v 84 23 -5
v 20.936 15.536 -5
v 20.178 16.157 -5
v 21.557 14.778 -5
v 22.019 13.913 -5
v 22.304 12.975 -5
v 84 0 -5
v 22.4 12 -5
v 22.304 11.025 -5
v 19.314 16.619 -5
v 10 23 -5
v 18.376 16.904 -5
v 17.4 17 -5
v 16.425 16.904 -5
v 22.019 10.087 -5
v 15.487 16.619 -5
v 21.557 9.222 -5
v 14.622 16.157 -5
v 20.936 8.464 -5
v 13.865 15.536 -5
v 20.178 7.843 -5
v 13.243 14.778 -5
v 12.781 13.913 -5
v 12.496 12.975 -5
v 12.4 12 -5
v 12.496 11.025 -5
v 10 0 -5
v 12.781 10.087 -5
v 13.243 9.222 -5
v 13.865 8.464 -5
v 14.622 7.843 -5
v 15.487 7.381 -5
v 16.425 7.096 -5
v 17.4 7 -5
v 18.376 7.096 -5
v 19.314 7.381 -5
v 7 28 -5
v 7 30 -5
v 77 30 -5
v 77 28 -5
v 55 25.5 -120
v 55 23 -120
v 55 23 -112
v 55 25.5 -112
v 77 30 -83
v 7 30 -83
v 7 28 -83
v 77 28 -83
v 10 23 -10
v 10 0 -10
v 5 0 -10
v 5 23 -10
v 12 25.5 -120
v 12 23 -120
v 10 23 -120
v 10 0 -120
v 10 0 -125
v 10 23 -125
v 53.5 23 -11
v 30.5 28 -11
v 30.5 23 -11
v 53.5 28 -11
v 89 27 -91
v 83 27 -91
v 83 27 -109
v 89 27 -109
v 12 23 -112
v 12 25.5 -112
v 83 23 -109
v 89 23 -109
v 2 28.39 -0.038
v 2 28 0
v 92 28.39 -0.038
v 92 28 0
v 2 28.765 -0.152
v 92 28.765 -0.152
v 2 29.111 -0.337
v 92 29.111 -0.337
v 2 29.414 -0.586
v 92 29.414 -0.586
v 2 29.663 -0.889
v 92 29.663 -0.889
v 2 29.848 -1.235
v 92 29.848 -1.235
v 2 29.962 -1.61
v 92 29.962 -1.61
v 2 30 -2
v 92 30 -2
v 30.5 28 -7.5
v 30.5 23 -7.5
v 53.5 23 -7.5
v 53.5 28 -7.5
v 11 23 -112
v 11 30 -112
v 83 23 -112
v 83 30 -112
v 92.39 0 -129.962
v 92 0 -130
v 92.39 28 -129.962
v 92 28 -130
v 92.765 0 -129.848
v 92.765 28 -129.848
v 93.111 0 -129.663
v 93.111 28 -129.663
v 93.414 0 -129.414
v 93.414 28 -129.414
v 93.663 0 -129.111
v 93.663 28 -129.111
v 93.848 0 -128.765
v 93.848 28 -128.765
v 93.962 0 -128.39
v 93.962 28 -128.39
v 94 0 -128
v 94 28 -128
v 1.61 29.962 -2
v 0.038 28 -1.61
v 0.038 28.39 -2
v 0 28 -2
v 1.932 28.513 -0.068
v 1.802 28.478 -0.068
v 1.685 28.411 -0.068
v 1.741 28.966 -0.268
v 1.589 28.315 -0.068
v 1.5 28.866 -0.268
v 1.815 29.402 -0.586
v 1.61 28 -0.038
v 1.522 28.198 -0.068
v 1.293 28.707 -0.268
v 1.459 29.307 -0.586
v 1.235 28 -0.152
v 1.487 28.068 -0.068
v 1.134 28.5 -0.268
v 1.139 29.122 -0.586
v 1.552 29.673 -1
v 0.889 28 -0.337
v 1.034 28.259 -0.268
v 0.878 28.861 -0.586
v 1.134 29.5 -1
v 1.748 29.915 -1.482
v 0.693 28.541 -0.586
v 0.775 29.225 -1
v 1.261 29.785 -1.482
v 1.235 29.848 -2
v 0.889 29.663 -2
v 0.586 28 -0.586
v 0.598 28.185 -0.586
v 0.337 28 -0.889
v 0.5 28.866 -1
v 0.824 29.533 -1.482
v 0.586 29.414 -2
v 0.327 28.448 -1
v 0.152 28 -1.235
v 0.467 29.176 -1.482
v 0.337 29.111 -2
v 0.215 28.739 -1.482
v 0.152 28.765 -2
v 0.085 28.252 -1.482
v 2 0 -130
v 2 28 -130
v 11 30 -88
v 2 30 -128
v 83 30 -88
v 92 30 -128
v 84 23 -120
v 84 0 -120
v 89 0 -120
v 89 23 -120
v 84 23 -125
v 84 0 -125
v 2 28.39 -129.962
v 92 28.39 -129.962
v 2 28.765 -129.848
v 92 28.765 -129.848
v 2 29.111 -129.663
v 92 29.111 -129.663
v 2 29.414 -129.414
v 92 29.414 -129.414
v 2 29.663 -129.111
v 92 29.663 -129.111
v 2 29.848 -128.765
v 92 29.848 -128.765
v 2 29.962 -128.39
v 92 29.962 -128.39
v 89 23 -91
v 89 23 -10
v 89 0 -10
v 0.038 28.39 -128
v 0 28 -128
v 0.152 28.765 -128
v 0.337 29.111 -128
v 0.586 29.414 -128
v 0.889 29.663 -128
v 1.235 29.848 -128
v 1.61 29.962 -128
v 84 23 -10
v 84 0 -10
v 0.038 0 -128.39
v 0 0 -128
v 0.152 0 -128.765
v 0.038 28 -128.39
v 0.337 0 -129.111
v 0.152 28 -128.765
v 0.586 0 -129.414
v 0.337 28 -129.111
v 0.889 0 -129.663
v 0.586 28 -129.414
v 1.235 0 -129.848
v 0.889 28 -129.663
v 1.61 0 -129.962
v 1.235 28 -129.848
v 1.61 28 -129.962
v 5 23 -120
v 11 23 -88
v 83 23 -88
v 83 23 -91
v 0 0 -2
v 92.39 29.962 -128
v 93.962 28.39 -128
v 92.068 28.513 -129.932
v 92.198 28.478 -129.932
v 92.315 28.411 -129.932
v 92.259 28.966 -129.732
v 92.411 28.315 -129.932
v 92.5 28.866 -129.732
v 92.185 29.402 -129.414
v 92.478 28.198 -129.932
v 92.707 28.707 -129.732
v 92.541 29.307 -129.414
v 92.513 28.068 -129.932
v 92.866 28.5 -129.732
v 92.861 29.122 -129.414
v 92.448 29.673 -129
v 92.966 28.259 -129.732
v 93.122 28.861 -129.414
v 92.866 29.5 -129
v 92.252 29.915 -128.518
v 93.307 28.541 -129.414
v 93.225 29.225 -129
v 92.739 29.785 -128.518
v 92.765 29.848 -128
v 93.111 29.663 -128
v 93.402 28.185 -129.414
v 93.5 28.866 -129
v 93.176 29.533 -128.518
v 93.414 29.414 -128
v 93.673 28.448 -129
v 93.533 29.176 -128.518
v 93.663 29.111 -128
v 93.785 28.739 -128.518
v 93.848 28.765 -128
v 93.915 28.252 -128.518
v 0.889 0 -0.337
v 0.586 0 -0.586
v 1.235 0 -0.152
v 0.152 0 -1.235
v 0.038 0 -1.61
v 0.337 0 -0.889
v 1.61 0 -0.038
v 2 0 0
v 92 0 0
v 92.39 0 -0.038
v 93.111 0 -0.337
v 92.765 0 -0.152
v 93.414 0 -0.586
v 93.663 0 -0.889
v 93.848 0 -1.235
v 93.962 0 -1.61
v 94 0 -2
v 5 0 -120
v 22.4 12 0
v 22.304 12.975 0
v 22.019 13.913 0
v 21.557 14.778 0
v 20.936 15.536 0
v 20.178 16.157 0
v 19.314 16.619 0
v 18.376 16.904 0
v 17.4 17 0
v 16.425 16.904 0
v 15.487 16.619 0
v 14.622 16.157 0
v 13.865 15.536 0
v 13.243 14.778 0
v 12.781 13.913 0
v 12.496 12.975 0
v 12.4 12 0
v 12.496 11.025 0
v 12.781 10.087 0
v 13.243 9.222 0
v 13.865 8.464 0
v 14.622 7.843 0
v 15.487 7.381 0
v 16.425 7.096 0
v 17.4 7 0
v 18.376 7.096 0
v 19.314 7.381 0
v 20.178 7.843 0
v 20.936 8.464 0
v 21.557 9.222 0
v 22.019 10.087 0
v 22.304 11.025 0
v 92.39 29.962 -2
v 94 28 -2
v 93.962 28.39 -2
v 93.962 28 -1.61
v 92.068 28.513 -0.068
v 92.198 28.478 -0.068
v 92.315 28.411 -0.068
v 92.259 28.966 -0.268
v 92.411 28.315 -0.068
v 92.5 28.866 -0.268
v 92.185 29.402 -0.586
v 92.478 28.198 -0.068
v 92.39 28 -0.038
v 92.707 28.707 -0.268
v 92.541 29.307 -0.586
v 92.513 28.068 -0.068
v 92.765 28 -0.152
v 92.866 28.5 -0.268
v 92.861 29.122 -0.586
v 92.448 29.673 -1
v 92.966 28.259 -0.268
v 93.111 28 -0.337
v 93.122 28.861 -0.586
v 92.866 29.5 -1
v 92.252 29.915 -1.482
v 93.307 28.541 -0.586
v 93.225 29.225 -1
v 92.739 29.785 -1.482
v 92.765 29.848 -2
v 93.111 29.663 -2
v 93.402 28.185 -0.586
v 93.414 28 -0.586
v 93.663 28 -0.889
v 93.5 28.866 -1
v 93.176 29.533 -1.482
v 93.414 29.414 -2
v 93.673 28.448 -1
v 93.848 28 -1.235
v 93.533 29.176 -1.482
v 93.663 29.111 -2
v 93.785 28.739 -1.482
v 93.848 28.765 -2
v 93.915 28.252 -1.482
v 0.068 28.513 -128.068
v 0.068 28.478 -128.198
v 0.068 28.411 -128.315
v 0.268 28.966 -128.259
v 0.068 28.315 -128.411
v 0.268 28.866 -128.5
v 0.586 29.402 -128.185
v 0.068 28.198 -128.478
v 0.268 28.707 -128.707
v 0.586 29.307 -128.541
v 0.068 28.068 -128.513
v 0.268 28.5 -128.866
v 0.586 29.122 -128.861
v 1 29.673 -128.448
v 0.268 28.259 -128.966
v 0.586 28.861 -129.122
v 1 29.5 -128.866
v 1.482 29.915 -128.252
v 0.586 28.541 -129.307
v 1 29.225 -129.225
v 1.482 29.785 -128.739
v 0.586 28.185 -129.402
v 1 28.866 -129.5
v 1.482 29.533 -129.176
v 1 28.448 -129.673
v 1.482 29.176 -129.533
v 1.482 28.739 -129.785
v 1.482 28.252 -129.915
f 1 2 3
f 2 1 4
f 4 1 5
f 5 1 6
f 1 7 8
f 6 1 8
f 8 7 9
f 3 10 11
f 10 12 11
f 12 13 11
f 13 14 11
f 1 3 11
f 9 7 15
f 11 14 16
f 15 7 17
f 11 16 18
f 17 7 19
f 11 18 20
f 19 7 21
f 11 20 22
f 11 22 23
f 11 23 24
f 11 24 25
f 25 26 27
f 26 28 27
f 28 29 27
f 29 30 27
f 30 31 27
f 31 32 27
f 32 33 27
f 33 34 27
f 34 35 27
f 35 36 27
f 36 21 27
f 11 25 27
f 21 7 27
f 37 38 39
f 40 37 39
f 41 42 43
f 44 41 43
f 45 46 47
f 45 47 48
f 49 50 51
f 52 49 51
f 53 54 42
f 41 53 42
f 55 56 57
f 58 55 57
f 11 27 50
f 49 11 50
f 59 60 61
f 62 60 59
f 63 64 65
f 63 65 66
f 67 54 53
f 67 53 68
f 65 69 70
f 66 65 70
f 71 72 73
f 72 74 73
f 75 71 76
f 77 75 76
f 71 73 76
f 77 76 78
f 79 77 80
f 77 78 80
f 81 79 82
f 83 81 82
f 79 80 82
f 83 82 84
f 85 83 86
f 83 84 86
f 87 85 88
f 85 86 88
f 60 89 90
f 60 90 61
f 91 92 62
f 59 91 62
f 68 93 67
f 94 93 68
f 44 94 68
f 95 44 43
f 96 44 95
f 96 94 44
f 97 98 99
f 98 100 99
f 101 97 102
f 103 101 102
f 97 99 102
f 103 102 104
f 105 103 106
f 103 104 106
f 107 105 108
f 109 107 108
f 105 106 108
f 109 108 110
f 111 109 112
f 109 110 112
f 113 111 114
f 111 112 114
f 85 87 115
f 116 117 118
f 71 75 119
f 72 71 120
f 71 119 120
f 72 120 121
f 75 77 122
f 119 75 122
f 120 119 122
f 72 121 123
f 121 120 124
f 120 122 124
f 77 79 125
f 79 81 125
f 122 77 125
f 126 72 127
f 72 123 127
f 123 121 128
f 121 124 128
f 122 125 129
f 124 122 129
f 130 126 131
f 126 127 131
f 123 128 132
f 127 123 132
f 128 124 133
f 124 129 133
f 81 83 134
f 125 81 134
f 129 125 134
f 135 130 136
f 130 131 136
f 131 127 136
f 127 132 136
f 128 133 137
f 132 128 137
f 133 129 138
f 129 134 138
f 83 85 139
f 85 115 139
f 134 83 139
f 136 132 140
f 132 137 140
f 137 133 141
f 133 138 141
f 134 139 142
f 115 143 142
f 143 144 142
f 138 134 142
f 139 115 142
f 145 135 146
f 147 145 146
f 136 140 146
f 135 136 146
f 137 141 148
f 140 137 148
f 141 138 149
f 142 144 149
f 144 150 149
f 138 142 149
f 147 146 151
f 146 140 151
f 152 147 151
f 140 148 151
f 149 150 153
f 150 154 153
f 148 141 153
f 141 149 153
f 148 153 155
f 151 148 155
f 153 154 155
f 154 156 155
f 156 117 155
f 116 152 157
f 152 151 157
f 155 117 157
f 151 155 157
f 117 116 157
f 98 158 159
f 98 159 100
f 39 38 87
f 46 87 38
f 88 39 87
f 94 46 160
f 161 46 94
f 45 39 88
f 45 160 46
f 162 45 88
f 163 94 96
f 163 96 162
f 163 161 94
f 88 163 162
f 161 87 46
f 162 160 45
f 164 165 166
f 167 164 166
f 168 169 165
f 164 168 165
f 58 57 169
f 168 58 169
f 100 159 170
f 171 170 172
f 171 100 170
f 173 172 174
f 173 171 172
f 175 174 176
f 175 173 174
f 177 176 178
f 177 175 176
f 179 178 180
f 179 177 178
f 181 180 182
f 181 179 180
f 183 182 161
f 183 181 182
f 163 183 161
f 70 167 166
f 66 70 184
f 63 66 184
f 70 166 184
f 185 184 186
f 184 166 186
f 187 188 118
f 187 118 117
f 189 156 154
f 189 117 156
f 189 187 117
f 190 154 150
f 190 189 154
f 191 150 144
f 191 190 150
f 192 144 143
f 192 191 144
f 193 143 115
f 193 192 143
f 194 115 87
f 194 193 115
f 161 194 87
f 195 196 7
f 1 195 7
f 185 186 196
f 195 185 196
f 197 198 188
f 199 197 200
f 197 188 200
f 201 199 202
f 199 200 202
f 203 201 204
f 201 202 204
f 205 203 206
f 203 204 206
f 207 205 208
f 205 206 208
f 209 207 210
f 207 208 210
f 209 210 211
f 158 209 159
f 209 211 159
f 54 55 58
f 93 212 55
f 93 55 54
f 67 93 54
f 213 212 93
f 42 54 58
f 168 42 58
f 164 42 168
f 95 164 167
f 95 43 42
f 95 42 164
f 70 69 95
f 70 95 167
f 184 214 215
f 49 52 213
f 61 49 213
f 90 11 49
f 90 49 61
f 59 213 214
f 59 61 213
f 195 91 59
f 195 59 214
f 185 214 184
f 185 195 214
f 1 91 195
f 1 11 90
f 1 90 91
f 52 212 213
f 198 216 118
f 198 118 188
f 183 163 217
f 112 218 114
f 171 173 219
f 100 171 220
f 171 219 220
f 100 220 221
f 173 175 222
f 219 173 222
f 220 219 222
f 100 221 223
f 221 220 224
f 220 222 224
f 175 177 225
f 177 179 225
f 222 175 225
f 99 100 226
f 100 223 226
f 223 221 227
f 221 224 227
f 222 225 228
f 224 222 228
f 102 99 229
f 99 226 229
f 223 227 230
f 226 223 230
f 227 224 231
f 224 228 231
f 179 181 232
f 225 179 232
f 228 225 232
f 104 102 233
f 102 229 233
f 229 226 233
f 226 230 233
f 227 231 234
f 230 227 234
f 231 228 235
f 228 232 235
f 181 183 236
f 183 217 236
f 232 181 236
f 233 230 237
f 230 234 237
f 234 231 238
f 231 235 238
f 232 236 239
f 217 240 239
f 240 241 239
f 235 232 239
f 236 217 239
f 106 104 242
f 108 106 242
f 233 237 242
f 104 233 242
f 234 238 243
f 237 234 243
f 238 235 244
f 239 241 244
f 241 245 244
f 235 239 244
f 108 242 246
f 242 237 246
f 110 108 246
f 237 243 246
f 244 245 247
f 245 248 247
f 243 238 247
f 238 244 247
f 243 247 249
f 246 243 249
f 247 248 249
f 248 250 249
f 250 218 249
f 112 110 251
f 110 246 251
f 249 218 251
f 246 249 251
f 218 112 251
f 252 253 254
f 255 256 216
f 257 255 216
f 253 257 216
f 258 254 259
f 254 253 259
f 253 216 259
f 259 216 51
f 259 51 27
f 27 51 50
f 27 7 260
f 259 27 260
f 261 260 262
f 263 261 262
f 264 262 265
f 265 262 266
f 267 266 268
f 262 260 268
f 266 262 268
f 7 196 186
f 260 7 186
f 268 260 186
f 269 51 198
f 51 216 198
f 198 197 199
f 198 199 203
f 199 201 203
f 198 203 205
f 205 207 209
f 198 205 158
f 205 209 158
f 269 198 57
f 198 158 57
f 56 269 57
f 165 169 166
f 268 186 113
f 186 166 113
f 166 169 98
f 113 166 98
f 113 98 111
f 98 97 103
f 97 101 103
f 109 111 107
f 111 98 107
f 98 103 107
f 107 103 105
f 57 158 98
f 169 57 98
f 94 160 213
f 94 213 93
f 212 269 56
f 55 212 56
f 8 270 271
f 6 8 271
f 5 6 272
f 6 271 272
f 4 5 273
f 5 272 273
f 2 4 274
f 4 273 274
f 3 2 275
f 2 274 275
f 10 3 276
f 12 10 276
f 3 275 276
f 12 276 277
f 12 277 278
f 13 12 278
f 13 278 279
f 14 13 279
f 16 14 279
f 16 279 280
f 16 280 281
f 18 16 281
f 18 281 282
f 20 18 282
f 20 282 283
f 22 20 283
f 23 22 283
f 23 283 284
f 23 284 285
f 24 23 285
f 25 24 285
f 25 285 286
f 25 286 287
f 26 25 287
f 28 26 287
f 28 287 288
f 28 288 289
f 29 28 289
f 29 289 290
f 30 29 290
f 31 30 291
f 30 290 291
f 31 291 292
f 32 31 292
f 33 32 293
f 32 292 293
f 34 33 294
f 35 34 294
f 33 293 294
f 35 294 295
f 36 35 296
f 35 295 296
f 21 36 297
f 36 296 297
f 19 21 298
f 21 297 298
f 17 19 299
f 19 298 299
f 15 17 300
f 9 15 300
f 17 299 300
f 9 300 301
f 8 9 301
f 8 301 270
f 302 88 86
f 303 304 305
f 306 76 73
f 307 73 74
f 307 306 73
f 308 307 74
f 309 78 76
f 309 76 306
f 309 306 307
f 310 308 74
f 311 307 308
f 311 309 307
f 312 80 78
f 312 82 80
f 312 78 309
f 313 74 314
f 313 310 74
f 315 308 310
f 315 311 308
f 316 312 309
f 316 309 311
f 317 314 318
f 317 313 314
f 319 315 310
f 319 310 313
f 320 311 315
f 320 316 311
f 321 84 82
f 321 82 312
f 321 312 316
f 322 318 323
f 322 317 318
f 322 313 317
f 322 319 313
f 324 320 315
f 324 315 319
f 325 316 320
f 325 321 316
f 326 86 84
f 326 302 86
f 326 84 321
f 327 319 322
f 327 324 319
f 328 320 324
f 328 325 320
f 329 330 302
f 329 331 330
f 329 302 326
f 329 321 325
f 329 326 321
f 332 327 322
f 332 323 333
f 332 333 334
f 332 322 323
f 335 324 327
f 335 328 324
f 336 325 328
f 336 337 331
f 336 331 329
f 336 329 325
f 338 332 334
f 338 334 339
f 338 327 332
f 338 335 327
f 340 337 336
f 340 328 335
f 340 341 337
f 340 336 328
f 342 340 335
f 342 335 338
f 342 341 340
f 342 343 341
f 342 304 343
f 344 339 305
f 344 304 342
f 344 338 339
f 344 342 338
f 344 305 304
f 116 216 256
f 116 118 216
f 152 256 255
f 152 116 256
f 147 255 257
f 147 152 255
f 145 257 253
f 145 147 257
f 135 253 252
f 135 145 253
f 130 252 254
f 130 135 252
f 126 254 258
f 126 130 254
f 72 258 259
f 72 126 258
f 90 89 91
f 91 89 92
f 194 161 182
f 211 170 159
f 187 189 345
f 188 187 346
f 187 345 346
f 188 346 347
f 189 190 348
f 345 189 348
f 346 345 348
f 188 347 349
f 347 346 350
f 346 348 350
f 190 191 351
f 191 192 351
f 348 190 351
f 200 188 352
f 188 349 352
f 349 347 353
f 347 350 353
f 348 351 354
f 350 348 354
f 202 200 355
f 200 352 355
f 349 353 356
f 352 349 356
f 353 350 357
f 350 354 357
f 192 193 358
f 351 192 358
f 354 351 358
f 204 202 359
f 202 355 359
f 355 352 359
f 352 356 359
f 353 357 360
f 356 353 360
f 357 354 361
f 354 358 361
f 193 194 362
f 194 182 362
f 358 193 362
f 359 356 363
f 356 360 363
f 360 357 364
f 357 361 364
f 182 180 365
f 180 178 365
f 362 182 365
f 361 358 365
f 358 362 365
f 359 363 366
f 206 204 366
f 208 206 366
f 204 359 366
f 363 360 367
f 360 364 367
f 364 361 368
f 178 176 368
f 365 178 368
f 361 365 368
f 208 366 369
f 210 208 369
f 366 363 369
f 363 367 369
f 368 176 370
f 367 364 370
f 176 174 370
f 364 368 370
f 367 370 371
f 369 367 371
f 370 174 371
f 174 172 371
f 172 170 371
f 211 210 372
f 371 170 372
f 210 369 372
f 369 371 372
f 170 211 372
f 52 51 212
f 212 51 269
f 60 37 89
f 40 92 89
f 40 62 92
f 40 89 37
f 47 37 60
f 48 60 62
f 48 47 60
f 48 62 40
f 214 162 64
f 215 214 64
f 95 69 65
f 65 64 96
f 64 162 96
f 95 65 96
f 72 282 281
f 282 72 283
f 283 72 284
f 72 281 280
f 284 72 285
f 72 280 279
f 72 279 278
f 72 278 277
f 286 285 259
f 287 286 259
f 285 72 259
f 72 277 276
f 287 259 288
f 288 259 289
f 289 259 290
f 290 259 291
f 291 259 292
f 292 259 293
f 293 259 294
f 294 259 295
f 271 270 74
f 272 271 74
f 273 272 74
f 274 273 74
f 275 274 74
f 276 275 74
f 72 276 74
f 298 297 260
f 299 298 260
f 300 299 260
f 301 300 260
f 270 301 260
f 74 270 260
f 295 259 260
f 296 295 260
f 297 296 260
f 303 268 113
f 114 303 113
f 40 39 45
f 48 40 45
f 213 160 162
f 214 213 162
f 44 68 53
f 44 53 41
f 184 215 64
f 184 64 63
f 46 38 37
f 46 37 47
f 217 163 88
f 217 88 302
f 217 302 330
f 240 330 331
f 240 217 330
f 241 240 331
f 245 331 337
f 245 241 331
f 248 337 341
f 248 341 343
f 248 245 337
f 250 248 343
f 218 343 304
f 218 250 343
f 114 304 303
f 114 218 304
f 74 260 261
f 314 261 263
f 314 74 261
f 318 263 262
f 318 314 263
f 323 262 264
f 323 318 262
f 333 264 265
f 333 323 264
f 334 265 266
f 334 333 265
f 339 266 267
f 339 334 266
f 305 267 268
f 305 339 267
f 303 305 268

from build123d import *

# Parameters (mm, degrees)
SKETCH1_W           = 94
SKETCH1_H           = 130
BOSS_EXTRUDE1_DEPTH = 30
CUT_EXTRUDE2_DEPTH  = 23
SKETCH7_W           = 72
SKETCH7_H           = 24
CUT_EXTRUDE3_DEPTH  = 164.205392068
SKETCH8_W           = 6
SKETCH8_H           = 18
CUT_EXTRUDE4_DEPTH  = 4
SKETCH9_W           = 43
SKETCH9_H           = 8
CUT_EXTRUDE5_DEPTH  = 2.5
SKETCH10_W          = 70
SKETCH10_H          = 78
CUT_EXTRUDE6_DEPTH  = 2
SKETCH11_W          = 23
SKETCH11_H          = 3.5
CUT_EXTRUDE7_DEPTH  = 163.849623887
FILLET1_R           = 2
SKETCH12_R          = 5
CUT_EXTRUDE8_DEPTH  = 10


with BuildPart() as part:
    # Sketch1 → Boss-Extrude1 (new body)
    with BuildSketch(Plane(origin=(0, 0, 0), x_dir=(1, 0, 0), z_dir=(0, 1, 0))):
        with Locations((47, 65)):
            Rectangle(SKETCH1_W, SKETCH1_H)
    extrude(amount=BOSS_EXTRUDE1_DEPTH)

    # Sketch6 → Cut-Extrude2 (cut)
    with BuildSketch(Plane.XZ):
        Polygon((84, -125), (84, -120), (89, -120), (89, -10), (84, -10), (84, -5), (10, -5), (10, -10), (5, -10), (5, -120), (10, -120), (10, -125), align=None)
    extrude(amount=-CUT_EXTRUDE2_DEPTH, mode=Mode.SUBTRACT)

    # Sketch7 → Cut-Extrude3 (cut, through all)
    with BuildSketch(Plane(origin=(0, 30, 0), x_dir=(1, 0, 0), z_dir=(0, 1, 0))):
        with Locations((47, 100)):
            Rectangle(SKETCH7_W, SKETCH7_H)
    extrude(amount=-CUT_EXTRUDE3_DEPTH, mode=Mode.SUBTRACT)

    # Sketch8 → Cut-Extrude4 (cut)
    with BuildSketch(Plane.XZ.offset(-23)):
        with Locations((86, -100)):
            Rectangle(SKETCH8_W, SKETCH8_H)
    extrude(amount=-CUT_EXTRUDE4_DEPTH, mode=Mode.SUBTRACT)

    # Sketch9 → Cut-Extrude5 (cut)
    with BuildSketch(Plane.XZ.offset(-23)):
        with Locations((33.5, -116)):
            Rectangle(SKETCH9_W, SKETCH9_H)
    extrude(amount=-CUT_EXTRUDE5_DEPTH, mode=Mode.SUBTRACT)

    # Sketch10 → Cut-Extrude6 (cut)
    with BuildSketch(Plane(origin=(0, 30, 0), x_dir=(1, 0, 0), z_dir=(0, 1, 0))):
        with Locations((42, 44)):
            Rectangle(SKETCH10_W, SKETCH10_H)
    extrude(amount=-CUT_EXTRUDE6_DEPTH, mode=Mode.SUBTRACT)

    # Sketch11 → Cut-Extrude7 (cut, through all)
    with BuildSketch(Plane(origin=(0, 28, 0), x_dir=(1, 0, 0), z_dir=(0, 1, 0))):
        with Locations((42, 9.25)):
            Rectangle(SKETCH11_W, SKETCH11_H)
    extrude(amount=-CUT_EXTRUDE7_DEPTH, mode=Mode.SUBTRACT)

    # Fillet1
    fillet1_edges = [part.edges().sort_by_distance(p)[0] for p in [
        (94, 30, -65),
        (47, 30, -130),
        (0, 30, -65),
        (47, 30, 0),
        (0, 15, -130),
        (94, 15, -130),
        (94, 15, 0),
        (0, 15, 0),
    ]]
    fillet(fillet1_edges, radius=FILLET1_R)

    # Sketch12 → Cut-Extrude8 (cut)
    with BuildSketch(Plane.XY):
        with Locations((17.400096769, 12)):
            Circle(SKETCH12_R)
    extrude(amount=-CUT_EXTRUDE8_DEPTH, mode=Mode.SUBTRACT)


solid = part.part
